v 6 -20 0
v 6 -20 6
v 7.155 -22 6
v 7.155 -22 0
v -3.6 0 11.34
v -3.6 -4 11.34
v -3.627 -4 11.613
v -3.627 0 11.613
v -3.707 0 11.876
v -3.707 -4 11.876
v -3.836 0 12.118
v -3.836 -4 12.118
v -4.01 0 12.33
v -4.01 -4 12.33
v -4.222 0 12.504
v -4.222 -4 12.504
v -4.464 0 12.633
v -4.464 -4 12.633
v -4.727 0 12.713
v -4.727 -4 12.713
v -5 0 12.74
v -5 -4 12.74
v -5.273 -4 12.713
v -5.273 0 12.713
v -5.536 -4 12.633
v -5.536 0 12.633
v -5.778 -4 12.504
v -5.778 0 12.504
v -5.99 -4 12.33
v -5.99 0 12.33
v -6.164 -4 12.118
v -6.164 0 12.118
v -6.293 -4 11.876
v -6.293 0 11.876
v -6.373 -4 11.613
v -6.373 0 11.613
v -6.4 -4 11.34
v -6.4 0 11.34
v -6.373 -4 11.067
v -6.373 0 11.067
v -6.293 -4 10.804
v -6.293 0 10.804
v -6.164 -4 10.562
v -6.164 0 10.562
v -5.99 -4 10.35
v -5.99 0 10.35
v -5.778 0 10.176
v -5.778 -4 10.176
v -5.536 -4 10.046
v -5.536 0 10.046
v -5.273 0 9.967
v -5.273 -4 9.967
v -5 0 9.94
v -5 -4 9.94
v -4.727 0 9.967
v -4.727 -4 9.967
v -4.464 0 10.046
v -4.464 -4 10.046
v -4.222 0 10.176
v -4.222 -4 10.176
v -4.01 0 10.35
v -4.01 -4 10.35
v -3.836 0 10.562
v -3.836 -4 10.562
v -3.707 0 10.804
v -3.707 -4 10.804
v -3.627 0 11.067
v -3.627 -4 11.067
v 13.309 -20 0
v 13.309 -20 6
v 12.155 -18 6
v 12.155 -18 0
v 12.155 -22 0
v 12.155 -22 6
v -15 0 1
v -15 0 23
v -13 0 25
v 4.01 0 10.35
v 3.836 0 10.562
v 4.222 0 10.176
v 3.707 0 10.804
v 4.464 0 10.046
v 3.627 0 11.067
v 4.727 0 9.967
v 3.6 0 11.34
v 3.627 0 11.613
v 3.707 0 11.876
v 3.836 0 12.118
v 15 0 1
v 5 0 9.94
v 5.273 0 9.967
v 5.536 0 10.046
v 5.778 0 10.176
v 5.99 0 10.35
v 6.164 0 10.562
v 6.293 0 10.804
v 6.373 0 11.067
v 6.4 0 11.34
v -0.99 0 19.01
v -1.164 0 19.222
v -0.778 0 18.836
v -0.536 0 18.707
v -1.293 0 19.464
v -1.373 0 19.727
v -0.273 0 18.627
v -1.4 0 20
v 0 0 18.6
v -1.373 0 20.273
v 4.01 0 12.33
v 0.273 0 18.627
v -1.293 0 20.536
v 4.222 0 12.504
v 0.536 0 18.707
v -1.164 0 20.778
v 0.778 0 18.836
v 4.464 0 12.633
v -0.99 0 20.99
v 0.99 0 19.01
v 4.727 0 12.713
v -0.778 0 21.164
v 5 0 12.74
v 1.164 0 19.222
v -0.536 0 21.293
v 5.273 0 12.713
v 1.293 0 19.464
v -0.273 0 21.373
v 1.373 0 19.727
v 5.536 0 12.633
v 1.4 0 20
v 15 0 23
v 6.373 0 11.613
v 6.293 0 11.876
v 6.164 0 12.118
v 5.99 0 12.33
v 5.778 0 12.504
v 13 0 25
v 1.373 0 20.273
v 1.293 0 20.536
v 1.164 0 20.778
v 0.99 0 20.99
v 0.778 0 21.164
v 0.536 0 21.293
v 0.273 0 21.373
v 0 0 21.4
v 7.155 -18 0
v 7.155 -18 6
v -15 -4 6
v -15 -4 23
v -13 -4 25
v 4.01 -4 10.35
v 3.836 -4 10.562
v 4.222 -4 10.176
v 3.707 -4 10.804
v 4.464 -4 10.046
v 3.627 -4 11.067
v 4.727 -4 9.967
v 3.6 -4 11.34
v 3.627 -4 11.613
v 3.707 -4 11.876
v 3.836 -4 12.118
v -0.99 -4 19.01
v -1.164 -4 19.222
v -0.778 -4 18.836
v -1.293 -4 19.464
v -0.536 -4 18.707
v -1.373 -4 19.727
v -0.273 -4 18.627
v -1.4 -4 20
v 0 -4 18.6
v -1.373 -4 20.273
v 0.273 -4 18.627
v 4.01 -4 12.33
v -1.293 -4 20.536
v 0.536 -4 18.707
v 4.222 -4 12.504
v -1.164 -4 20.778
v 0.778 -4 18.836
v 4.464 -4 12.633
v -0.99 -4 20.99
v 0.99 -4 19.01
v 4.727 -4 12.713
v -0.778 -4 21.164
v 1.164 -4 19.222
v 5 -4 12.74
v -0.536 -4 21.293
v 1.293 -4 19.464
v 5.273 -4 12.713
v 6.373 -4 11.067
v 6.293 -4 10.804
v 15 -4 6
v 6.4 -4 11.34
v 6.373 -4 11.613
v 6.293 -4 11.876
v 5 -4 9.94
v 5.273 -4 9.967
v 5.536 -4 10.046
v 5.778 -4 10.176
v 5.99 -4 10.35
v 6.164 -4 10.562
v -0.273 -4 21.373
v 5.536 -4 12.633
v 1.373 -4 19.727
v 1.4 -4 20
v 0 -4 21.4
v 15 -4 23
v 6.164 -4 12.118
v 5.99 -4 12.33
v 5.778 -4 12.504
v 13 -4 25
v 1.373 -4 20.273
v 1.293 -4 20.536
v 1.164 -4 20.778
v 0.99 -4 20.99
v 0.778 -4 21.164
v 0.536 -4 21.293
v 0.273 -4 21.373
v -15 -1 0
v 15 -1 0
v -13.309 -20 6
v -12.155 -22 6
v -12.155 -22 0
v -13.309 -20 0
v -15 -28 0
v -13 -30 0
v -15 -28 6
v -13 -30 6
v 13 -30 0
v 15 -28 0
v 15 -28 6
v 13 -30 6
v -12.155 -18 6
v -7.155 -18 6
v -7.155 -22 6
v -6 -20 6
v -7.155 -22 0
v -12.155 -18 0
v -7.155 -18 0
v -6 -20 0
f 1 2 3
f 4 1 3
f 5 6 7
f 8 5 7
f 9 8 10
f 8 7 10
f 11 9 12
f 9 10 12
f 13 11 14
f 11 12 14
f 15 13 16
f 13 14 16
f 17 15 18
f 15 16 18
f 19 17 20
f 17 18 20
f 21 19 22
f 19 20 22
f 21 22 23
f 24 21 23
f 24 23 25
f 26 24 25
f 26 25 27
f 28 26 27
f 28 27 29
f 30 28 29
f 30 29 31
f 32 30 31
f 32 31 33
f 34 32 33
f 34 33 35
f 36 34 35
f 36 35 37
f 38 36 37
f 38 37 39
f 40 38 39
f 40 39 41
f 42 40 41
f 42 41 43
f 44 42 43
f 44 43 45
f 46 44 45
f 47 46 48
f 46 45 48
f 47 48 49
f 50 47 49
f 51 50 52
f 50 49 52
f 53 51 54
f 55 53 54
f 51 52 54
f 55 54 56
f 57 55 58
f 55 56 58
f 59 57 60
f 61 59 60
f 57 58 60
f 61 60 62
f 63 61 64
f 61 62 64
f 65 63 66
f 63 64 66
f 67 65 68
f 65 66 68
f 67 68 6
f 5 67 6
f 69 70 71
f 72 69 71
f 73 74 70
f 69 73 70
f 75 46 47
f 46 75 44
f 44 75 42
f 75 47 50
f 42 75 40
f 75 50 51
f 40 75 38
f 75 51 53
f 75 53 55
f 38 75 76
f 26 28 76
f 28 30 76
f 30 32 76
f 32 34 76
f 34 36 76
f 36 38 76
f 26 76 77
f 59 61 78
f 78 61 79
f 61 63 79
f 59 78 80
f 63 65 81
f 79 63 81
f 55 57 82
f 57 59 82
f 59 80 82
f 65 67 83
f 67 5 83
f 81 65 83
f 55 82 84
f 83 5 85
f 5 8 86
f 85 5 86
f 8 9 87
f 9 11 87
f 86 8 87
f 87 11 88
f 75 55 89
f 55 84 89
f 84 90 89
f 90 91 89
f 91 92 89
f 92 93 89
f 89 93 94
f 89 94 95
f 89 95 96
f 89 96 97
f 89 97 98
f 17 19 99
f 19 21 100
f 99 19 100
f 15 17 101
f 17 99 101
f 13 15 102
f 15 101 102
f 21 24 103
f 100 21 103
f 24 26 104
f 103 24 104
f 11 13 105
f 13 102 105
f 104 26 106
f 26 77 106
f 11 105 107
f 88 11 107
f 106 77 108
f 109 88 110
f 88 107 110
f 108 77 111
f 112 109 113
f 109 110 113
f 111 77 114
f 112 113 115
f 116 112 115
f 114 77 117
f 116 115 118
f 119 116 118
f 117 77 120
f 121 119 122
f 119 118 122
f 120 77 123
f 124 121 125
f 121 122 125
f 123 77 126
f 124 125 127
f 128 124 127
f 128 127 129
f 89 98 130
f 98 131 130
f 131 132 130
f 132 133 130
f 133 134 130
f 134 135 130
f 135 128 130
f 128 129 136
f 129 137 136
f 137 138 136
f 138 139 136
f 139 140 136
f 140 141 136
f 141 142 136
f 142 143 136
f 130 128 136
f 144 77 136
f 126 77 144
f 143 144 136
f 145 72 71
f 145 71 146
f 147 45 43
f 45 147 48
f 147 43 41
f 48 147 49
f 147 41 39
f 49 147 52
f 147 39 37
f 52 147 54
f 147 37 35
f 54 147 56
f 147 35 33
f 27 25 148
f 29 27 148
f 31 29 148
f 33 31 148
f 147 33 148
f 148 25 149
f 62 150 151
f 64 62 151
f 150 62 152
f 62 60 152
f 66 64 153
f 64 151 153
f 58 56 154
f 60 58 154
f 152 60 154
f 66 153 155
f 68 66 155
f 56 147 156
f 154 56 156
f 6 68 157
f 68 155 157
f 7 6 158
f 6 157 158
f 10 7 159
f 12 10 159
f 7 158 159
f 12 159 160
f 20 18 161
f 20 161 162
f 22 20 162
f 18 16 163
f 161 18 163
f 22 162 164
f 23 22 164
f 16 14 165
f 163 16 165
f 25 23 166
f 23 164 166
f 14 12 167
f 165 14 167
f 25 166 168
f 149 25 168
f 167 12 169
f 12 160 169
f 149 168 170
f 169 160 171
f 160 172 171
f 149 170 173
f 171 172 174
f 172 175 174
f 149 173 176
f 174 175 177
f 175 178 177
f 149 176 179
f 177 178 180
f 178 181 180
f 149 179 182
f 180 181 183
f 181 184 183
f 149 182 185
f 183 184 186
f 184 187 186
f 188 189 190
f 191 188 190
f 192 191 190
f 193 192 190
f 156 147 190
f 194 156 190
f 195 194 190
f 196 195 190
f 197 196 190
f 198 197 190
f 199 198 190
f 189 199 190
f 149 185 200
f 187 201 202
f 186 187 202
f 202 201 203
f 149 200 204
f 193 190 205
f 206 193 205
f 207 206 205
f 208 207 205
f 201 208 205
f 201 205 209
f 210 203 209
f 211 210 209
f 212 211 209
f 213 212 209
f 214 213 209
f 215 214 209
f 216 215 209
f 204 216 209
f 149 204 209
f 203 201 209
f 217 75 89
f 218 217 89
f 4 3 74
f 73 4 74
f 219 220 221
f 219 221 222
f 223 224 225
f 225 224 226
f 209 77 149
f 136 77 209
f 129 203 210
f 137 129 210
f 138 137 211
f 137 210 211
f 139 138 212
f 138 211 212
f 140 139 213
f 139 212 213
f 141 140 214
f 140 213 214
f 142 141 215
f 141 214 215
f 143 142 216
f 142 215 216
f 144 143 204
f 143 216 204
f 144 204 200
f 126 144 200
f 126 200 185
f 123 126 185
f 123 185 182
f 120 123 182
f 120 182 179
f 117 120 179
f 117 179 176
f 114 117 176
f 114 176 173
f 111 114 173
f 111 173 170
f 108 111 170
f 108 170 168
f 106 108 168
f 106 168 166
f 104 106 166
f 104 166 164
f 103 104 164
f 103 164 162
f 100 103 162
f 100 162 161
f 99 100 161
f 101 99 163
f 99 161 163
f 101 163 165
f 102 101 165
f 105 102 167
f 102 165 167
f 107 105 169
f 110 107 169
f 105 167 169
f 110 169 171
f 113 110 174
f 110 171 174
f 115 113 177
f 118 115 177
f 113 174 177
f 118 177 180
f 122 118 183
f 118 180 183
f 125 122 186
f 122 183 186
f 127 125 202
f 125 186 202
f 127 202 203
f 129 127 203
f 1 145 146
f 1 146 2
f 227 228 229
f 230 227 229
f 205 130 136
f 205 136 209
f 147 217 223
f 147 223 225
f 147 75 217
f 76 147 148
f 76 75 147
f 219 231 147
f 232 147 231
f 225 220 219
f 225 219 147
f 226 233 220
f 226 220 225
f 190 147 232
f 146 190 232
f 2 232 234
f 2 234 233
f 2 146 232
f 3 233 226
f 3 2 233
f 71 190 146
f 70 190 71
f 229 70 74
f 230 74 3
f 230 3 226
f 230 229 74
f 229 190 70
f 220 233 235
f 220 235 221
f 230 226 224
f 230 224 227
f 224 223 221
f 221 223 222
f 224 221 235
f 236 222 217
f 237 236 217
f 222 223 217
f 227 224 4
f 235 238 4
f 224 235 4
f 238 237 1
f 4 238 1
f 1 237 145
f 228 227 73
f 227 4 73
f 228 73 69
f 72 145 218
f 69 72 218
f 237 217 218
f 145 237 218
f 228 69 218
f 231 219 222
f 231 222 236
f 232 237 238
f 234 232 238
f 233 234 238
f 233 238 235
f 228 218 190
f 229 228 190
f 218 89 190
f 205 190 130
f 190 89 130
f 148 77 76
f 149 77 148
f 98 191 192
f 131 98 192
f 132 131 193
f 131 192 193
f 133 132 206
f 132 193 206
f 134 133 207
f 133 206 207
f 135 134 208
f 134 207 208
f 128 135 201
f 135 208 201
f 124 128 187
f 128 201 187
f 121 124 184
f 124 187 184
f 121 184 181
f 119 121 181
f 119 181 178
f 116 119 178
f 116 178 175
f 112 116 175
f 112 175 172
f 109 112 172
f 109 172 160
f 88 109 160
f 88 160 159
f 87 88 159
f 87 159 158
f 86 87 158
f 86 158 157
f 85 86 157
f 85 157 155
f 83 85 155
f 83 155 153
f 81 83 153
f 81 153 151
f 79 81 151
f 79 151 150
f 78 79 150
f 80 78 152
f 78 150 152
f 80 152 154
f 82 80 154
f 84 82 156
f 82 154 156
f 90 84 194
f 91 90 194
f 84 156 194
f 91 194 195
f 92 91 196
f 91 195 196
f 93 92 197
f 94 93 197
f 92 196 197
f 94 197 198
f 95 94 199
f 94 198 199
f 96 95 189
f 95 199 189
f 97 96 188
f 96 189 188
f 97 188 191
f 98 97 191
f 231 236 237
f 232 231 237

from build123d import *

# Parameters (mm, degrees)
SKETCH_W        = 30
SKETCH_H        = 25
PAD_DEPTH       = 30
SKETCH001_W     = 20.784298
SKETCH001_H     = 31.024467
POCKET_DEPTH    = 30.001
POCKET001_DEPTH = 104.489578018
SKETCH003_R     = 1.4
POCKET002_DEPTH = 5
CHAMFER_SIZE    = 2
CHAMFER001_SIZE = 2
CHAMFER002_SIZE = 1


with BuildPart() as part:
    # Sketch → Pad (new body)
    with BuildSketch(Plane.XZ):
        with Locations((0, 12.5)):
            Rectangle(SKETCH_W, SKETCH_H)
    extrude(amount=PAD_DEPTH)

    # Sketch001 (on Face2 of Pad) → Pocket (cut, through all)
    with BuildSketch(Plane(origin=(15, 0, 0), x_dir=(0, 0, 1), z_dir=(1, 0, 0))):
        with Locations((16.392149, 19.5122335)):
            Rectangle(SKETCH001_W, SKETCH001_H)
    extrude(amount=-POCKET_DEPTH, mode=Mode.SUBTRACT)

    # Sketch002 (on Face8 of Pocket) → Pocket001 (cut, through all)
    with BuildSketch(Plane(origin=(0, 0, 6), x_dir=(-1, 0, 0), z_dir=(0, 0, 1))):
        Polygon((-12.1547078033, 18.0000041944), (-7.1547078033, 18.0000041944), (-6, 20), (-7.1546932734, 22.0000041944), (-12.1547078033, 22.0000041944), (-13.3094083417, 20.0000041944), align=None)
    pocket001 = extrude(amount=-POCKET001_DEPTH, mode=Mode.SUBTRACT)

    # Mirrored: Pocket001 across Sketch002 V_Axis
    add(pocket001.mirror(Plane(origin=(0, 0, 6), x_dir=(0, 0, 1), z_dir=(-1, 0, 0))), mode=Mode.SUBTRACT)

    # Sketch003 (on Face4 of Pocket001) → Pocket002 (cut)
    with BuildSketch(Plane.XZ.offset(4)):
        with Locations((0, 20)):
            Circle(SKETCH003_R)
        with Locations((5, 11.3397459621)):
            Circle(SKETCH003_R)
        with Locations((-5, 11.3397459621)):
            Circle(SKETCH003_R)
    extrude(amount=-POCKET002_DEPTH, mode=Mode.SUBTRACT)

    # Chamfer
    chamfer_edges = [part.edges().sort_by_distance(p)[0] for p in [
        (-15, -2, 25),
        (15, -2, 25),
    ]]
    chamfer(chamfer_edges, length=CHAMFER_SIZE)

    # Chamfer001
    chamfer001_edges = [part.edges().sort_by_distance(p)[0] for p in [
        (15, -30, 3),
        (-15, -30, 3),
    ]]
    chamfer(chamfer001_edges, length=CHAMFER001_SIZE)

    # Chamfer002
    chamfer002_edges = [part.edges().sort_by_distance(p)[0] for p in [
        (0, 0, 0),
    ]]
    chamfer(chamfer002_edges, length=CHAMFER002_SIZE)


solid = part.part
